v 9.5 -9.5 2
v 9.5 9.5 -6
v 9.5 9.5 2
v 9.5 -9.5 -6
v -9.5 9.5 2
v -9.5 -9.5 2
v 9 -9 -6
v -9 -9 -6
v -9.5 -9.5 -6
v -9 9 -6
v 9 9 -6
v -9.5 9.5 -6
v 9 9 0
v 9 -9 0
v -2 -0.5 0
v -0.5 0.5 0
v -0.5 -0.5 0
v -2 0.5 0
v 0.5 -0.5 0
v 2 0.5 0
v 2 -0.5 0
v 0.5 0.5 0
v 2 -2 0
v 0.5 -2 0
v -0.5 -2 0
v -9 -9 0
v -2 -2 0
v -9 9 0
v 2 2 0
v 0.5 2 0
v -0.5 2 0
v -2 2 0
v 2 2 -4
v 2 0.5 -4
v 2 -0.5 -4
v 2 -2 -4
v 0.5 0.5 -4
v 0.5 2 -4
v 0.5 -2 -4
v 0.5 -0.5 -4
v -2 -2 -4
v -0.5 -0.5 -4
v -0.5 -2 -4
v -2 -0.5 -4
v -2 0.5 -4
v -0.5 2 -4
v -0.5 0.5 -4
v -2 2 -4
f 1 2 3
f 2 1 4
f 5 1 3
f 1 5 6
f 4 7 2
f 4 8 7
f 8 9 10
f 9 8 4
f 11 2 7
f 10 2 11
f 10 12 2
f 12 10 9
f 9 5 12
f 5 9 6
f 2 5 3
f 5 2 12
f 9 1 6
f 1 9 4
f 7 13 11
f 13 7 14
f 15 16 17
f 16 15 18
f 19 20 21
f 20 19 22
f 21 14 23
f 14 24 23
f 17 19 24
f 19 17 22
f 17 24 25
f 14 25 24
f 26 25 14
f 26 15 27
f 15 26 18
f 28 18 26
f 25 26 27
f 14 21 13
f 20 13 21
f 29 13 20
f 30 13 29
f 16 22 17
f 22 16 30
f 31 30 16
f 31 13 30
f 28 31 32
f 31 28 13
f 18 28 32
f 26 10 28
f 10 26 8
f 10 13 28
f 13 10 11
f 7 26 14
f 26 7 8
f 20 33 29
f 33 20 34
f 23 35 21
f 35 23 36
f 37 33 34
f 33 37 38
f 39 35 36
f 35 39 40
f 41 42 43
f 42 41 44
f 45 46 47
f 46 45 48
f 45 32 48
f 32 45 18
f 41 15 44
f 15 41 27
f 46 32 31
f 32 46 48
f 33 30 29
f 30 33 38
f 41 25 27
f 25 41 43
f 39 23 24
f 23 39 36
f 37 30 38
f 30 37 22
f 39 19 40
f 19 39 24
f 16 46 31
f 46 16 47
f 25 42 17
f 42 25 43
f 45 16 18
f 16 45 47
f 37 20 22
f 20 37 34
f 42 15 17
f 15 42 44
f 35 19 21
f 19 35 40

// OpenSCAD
cap_w = 19;
switch_h = 6; // distance from top of switch plate to top of switch (excl. stem)
stem_h = 4; // distance from top of switch to top of stem
stem_w = 4; // maximum distance across the stem
stem_t = 1; // thickness of the lines in the stem's "plus" shape
thickness_x = 1;
thickness_z = 2;

cap_h = switch_h + thickness_z;

translate([0, 0, -cap_h / 2 + thickness_z]) {
  difference() {
    cube([cap_w, cap_w, cap_h], center = true);
    translate([0, 0, -thickness_z]) {
      cube([
          cap_w - thickness_x,
          cap_w - thickness_x,
          cap_h,
        ], center = true);
    }
  }
}

translate([0, 0, -stem_h / 2]) {
  difference() {
    cube([stem_w, stem_w, stem_h], center = true);
    cube([stem_t, stem_w + 1, stem_h + 1], center = true);
    cube([stem_w + 1, stem_t, stem_h + 1], center = true);
  }
}
